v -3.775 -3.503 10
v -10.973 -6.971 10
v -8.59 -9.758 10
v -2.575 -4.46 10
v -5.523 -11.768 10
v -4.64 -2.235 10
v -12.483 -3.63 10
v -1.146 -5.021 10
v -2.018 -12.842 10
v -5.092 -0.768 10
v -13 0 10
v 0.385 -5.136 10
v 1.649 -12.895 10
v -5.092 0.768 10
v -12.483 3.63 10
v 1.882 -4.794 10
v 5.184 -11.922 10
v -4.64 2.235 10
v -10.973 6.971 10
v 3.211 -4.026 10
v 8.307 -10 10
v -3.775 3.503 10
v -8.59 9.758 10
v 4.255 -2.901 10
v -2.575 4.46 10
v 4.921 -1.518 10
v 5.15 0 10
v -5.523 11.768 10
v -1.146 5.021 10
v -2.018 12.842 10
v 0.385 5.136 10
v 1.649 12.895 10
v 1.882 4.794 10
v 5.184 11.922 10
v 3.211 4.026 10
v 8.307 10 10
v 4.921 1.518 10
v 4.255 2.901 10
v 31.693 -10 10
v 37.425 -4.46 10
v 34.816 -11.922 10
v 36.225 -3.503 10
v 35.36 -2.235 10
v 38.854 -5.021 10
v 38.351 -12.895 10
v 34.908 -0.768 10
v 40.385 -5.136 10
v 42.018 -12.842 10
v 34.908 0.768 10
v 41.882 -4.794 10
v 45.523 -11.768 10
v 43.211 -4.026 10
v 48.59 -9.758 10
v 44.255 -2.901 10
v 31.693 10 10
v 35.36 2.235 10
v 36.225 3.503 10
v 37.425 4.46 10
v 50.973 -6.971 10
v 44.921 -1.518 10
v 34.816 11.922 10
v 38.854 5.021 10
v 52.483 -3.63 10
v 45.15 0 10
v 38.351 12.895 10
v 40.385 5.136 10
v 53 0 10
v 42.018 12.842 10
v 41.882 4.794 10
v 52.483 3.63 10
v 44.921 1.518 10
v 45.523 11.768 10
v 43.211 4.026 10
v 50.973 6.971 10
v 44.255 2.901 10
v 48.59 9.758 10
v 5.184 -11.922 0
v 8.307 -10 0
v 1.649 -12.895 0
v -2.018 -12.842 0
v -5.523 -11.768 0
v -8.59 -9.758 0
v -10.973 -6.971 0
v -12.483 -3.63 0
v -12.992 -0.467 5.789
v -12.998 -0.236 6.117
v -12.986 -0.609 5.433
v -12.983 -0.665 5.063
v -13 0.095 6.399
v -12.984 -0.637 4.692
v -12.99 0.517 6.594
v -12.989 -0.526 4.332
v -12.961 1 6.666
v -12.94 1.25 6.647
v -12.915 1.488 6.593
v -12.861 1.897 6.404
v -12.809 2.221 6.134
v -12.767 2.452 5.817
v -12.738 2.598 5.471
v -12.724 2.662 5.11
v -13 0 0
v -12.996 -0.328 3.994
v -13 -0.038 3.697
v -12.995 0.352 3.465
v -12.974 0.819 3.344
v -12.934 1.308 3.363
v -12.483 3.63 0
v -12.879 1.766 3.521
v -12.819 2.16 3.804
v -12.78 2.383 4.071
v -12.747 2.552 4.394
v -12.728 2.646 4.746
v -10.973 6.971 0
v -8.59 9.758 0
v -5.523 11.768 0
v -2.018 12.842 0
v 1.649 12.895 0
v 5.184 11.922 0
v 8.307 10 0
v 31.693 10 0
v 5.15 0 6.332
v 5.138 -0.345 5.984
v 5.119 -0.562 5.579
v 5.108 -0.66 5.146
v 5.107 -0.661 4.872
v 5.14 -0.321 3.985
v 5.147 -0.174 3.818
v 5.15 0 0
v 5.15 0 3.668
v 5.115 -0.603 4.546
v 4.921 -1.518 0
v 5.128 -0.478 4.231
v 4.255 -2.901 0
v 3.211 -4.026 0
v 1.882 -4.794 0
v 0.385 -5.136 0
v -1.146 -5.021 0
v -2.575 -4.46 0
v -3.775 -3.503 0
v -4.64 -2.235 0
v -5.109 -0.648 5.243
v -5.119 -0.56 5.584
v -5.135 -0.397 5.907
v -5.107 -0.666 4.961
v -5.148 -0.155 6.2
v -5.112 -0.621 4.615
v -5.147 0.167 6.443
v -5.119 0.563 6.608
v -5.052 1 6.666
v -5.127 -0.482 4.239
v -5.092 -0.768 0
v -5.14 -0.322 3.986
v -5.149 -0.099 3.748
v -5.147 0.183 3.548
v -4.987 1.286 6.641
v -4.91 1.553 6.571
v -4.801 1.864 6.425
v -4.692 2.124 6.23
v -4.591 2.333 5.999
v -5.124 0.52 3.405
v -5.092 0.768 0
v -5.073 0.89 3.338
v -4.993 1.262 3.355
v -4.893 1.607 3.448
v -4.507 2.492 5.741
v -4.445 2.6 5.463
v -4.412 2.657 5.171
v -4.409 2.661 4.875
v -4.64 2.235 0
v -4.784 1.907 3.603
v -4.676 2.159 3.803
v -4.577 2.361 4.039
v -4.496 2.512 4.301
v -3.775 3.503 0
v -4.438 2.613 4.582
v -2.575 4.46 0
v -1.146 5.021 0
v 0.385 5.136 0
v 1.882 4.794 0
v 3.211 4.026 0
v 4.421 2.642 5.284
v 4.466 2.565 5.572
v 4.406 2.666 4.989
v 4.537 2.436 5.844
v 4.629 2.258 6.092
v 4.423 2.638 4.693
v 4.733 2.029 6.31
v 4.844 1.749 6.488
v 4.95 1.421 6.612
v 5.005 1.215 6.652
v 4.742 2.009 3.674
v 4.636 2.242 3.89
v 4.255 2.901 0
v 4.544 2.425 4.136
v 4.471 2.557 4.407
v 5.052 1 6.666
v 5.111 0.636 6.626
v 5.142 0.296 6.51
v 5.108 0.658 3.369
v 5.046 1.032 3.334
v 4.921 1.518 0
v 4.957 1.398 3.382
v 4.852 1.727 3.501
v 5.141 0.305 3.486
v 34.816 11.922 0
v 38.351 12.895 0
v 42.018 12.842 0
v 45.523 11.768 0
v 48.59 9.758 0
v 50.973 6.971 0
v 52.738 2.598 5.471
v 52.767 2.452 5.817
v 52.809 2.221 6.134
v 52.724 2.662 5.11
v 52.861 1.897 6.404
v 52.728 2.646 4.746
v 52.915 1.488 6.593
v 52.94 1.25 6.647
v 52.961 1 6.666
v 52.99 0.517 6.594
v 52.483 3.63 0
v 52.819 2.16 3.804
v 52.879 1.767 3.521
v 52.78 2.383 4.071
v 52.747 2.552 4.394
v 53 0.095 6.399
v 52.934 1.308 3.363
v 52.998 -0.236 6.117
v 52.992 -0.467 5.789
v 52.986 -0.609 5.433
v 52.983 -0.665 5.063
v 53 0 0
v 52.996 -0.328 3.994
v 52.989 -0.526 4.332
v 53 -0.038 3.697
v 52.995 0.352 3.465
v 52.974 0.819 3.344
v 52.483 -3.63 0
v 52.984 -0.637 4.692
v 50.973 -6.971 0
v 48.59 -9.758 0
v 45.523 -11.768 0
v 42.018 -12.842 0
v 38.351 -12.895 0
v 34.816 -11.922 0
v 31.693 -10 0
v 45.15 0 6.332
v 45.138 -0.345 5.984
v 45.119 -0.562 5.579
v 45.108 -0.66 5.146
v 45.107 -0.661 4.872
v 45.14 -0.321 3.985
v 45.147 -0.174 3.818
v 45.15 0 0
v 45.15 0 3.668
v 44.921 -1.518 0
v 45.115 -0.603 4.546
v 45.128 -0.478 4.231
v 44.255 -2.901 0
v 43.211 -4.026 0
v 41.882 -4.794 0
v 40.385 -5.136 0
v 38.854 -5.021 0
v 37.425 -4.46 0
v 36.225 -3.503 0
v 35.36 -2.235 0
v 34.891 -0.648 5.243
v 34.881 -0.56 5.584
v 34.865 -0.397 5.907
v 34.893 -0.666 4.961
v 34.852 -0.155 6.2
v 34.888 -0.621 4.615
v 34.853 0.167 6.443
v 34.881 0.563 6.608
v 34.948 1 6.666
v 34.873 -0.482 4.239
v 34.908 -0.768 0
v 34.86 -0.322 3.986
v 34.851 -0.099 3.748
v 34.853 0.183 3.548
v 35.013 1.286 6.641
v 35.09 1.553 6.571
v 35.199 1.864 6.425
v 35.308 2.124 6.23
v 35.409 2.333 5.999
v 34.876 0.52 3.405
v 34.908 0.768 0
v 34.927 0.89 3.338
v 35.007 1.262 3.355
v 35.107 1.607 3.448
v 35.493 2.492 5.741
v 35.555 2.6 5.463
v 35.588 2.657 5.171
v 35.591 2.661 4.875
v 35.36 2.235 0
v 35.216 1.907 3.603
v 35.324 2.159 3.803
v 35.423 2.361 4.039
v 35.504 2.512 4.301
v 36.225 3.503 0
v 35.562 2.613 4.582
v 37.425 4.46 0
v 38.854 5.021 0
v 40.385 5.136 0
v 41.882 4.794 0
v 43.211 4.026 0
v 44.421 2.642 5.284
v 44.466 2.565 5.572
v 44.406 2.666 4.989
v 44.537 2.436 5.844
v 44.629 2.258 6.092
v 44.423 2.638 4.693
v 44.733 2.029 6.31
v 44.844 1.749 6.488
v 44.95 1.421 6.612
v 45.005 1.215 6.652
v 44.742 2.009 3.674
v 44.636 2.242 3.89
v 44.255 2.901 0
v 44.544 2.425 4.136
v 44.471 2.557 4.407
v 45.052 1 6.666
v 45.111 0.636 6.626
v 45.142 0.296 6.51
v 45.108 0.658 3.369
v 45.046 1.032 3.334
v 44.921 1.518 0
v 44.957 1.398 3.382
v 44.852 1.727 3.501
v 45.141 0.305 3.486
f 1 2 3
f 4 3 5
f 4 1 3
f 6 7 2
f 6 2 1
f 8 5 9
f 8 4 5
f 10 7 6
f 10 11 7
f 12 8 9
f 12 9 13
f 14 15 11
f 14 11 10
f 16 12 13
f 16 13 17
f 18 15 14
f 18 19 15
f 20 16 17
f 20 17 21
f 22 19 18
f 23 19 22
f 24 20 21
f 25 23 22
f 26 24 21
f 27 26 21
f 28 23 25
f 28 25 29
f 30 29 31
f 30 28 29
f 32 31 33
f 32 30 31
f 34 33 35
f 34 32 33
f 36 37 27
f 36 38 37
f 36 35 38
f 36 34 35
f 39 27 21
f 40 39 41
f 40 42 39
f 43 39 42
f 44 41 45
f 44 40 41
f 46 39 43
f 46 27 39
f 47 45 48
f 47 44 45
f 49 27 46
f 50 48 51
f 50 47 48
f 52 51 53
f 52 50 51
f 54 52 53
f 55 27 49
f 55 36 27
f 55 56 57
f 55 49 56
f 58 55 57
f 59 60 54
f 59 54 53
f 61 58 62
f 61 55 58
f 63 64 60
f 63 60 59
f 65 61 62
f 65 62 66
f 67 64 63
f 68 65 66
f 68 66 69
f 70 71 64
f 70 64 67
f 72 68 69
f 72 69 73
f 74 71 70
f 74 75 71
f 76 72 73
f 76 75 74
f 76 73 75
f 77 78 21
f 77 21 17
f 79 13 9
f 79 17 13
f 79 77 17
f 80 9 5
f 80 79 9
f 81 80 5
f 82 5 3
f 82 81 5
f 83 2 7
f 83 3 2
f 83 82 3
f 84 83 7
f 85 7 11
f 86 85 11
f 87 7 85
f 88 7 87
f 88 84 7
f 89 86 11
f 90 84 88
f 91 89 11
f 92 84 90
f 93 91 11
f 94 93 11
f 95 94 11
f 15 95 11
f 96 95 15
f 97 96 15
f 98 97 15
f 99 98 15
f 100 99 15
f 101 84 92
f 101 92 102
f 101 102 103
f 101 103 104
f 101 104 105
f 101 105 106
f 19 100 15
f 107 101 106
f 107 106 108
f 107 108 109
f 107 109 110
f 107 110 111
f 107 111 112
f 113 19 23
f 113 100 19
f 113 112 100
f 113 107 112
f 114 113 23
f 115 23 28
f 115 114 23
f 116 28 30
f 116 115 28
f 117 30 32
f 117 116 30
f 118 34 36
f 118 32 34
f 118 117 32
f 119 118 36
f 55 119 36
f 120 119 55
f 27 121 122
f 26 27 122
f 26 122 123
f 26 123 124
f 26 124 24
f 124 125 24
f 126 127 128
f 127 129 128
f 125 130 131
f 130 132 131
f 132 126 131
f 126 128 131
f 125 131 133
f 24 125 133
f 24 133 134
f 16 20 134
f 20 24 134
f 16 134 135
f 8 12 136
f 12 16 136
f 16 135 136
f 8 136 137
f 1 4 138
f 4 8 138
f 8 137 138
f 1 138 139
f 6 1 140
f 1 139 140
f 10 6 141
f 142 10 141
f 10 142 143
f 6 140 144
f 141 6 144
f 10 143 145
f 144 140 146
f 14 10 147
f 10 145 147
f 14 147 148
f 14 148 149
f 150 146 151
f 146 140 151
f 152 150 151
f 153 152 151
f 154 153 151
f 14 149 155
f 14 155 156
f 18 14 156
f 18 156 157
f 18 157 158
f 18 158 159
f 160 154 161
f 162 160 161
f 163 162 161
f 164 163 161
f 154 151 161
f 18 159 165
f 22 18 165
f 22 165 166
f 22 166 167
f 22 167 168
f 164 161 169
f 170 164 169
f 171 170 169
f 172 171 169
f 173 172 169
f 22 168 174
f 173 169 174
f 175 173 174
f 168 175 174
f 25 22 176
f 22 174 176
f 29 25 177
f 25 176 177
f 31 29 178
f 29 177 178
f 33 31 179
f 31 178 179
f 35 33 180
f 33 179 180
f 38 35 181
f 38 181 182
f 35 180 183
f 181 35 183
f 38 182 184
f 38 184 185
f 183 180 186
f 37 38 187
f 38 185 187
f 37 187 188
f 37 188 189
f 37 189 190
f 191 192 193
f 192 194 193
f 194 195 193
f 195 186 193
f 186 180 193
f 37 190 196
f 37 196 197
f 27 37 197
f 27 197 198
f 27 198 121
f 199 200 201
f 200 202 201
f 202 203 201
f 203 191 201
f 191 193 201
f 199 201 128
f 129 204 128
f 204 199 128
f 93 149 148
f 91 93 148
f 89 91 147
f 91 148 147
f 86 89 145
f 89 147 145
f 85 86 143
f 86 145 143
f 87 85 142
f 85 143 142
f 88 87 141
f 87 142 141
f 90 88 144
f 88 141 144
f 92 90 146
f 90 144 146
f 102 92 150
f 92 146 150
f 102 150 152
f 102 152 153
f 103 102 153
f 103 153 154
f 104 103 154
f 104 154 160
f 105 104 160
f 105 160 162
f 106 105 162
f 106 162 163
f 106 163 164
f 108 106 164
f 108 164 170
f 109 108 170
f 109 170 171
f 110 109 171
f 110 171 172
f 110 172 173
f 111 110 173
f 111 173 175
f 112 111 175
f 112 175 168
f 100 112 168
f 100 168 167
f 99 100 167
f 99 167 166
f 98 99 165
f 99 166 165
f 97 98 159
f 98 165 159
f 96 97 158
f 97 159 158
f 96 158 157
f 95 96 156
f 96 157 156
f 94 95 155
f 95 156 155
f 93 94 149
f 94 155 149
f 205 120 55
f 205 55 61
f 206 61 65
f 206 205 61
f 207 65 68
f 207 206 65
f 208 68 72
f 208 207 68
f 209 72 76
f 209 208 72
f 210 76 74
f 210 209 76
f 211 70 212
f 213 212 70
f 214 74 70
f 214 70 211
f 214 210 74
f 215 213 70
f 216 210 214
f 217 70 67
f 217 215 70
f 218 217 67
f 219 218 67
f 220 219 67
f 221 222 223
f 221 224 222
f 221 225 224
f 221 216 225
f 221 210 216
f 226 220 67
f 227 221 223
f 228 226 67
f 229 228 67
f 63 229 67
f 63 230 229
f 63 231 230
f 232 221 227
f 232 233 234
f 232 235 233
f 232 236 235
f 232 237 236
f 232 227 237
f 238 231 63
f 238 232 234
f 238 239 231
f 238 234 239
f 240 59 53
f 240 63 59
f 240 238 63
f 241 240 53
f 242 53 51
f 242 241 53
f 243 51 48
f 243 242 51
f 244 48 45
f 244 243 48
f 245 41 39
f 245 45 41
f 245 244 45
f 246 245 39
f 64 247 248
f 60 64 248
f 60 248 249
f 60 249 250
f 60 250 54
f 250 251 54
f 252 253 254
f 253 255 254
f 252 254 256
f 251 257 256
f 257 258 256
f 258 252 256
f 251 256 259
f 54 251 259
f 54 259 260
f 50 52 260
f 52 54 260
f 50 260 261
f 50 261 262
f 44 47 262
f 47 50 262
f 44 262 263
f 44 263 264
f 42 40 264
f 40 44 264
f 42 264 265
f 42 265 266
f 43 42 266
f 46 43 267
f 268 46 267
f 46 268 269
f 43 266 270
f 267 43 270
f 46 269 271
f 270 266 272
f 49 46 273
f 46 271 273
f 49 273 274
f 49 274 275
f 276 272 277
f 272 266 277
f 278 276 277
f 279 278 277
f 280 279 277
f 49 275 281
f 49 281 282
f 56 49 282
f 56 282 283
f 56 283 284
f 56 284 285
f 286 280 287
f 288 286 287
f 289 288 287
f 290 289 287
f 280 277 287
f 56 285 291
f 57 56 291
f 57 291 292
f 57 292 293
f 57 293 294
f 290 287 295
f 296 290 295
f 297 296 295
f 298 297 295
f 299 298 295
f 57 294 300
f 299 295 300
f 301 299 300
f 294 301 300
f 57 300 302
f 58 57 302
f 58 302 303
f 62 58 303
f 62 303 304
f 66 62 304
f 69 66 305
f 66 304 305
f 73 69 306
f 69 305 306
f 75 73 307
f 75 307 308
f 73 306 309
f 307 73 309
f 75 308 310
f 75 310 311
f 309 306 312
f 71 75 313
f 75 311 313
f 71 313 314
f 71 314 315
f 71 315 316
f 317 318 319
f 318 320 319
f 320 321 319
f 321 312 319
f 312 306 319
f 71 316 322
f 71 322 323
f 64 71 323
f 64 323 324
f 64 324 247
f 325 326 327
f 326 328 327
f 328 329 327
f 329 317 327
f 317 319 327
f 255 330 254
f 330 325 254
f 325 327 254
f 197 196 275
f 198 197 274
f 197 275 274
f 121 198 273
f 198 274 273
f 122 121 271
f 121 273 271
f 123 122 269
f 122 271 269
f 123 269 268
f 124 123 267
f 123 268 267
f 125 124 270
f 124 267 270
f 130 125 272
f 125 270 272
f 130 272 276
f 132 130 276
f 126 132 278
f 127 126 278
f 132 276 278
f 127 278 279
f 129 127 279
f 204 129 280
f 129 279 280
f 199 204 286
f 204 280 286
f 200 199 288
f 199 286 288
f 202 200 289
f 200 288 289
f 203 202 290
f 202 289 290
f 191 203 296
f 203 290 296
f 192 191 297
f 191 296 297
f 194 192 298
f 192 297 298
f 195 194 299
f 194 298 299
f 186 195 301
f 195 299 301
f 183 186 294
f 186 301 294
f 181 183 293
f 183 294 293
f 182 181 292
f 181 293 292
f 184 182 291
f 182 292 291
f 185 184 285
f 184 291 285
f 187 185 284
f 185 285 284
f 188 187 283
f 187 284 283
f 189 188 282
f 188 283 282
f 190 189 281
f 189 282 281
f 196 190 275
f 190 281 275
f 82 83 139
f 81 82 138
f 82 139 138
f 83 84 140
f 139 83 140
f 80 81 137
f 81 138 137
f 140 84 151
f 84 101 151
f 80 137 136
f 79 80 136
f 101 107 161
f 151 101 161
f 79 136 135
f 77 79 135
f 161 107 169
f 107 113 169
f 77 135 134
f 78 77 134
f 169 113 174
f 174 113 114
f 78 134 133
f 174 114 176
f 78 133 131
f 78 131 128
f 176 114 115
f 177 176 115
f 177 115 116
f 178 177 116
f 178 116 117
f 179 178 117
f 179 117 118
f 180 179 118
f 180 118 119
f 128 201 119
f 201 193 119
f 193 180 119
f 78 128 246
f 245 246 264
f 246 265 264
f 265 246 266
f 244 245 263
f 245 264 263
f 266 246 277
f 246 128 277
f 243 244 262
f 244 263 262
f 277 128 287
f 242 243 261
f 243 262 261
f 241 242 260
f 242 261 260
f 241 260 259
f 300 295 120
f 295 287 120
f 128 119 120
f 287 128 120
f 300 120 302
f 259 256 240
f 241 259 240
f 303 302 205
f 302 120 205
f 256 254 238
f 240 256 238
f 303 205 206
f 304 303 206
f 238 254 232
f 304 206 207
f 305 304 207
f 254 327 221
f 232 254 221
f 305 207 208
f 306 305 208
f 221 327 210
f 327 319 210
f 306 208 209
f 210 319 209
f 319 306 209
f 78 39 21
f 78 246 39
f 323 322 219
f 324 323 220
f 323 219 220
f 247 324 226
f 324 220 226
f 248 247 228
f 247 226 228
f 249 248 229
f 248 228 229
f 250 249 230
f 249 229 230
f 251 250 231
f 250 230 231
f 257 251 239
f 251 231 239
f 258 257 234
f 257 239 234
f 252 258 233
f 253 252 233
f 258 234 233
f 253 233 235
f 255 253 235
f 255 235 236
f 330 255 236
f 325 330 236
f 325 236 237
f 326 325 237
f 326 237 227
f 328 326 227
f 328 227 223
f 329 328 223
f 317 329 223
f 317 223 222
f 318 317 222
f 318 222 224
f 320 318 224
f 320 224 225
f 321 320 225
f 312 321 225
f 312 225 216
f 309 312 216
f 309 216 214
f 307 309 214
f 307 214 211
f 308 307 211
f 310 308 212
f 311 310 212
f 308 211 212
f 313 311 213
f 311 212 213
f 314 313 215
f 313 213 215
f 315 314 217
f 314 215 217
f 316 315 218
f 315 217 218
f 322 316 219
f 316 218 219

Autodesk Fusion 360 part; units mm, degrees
sketch "Eskiz1" plane through (0, 0, 0) normal (0, 0, 1) x (1, 0, 0)
  circle A0 centre (0, 0) radius 5.15
  circle A1 centre (40, 0) radius 5.15
  line L0 (8.3066, 10) -> (31.6934, 10)
  line L1 (20, -10) -> (8.3066, -10)
  line L2 (20, -10) -> (31.6934, -10)
  arc A2 (8.3066, 10) -> (8.3066, -10) centre (0, 0) ccw
  arc A3 (31.6934, -10) -> (31.6934, 10) centre (40, 0) ccw
  dimension "d1" = 26
  dimension "d2" = 40
  dimension "d3" = 26
  dimension "d4" = 10.3
  dimension "d5" = 10.3
extrude "Ekstrüde Et1" add sketch "Eskiz1" along normal blind 10 makes body 1
sketch "Eskiz2" plane through (0, 0, 0) normal (0, 0, 1) x (1, 0, 0)
  line L0 (-25, 0) -> (-24, 0)
  line L1 (-24, 0) -> (-24, 2)
  line L2 (-24, 2) -> (-25, 2)
  line L3 (-25, 2) -> (-25, 0)
extrude "Ekstrüde Et2" add sketch "Eskiz2" along normal blind 5 separate body makes body 2
sketch "Eskiz3" plane through (-25, 0, 0) normal (-1, 0, 0) x (0, -1, 0)
  line L0 (-2, 0) -> (0, 0)
  line L1 (0, 0) -> (0, 5)
  line L2 (0, 5) -> (-2, 5)
  line L3 (-2, 5) -> (-2, 0)
  line L4 (-1, 5) -> (-1, 4.2255)
hole "Delik1" at (-25, 1, 5) direction (1, 0, 0) diameter 3.332 depth 80 tip angle 118 bodies 1 2
delete_body "GövdeyiKaldır1" bodies 2
equation "d1 = 10 mm + 16 mm"
equation "d3 = 16 mm + 10 mm"
